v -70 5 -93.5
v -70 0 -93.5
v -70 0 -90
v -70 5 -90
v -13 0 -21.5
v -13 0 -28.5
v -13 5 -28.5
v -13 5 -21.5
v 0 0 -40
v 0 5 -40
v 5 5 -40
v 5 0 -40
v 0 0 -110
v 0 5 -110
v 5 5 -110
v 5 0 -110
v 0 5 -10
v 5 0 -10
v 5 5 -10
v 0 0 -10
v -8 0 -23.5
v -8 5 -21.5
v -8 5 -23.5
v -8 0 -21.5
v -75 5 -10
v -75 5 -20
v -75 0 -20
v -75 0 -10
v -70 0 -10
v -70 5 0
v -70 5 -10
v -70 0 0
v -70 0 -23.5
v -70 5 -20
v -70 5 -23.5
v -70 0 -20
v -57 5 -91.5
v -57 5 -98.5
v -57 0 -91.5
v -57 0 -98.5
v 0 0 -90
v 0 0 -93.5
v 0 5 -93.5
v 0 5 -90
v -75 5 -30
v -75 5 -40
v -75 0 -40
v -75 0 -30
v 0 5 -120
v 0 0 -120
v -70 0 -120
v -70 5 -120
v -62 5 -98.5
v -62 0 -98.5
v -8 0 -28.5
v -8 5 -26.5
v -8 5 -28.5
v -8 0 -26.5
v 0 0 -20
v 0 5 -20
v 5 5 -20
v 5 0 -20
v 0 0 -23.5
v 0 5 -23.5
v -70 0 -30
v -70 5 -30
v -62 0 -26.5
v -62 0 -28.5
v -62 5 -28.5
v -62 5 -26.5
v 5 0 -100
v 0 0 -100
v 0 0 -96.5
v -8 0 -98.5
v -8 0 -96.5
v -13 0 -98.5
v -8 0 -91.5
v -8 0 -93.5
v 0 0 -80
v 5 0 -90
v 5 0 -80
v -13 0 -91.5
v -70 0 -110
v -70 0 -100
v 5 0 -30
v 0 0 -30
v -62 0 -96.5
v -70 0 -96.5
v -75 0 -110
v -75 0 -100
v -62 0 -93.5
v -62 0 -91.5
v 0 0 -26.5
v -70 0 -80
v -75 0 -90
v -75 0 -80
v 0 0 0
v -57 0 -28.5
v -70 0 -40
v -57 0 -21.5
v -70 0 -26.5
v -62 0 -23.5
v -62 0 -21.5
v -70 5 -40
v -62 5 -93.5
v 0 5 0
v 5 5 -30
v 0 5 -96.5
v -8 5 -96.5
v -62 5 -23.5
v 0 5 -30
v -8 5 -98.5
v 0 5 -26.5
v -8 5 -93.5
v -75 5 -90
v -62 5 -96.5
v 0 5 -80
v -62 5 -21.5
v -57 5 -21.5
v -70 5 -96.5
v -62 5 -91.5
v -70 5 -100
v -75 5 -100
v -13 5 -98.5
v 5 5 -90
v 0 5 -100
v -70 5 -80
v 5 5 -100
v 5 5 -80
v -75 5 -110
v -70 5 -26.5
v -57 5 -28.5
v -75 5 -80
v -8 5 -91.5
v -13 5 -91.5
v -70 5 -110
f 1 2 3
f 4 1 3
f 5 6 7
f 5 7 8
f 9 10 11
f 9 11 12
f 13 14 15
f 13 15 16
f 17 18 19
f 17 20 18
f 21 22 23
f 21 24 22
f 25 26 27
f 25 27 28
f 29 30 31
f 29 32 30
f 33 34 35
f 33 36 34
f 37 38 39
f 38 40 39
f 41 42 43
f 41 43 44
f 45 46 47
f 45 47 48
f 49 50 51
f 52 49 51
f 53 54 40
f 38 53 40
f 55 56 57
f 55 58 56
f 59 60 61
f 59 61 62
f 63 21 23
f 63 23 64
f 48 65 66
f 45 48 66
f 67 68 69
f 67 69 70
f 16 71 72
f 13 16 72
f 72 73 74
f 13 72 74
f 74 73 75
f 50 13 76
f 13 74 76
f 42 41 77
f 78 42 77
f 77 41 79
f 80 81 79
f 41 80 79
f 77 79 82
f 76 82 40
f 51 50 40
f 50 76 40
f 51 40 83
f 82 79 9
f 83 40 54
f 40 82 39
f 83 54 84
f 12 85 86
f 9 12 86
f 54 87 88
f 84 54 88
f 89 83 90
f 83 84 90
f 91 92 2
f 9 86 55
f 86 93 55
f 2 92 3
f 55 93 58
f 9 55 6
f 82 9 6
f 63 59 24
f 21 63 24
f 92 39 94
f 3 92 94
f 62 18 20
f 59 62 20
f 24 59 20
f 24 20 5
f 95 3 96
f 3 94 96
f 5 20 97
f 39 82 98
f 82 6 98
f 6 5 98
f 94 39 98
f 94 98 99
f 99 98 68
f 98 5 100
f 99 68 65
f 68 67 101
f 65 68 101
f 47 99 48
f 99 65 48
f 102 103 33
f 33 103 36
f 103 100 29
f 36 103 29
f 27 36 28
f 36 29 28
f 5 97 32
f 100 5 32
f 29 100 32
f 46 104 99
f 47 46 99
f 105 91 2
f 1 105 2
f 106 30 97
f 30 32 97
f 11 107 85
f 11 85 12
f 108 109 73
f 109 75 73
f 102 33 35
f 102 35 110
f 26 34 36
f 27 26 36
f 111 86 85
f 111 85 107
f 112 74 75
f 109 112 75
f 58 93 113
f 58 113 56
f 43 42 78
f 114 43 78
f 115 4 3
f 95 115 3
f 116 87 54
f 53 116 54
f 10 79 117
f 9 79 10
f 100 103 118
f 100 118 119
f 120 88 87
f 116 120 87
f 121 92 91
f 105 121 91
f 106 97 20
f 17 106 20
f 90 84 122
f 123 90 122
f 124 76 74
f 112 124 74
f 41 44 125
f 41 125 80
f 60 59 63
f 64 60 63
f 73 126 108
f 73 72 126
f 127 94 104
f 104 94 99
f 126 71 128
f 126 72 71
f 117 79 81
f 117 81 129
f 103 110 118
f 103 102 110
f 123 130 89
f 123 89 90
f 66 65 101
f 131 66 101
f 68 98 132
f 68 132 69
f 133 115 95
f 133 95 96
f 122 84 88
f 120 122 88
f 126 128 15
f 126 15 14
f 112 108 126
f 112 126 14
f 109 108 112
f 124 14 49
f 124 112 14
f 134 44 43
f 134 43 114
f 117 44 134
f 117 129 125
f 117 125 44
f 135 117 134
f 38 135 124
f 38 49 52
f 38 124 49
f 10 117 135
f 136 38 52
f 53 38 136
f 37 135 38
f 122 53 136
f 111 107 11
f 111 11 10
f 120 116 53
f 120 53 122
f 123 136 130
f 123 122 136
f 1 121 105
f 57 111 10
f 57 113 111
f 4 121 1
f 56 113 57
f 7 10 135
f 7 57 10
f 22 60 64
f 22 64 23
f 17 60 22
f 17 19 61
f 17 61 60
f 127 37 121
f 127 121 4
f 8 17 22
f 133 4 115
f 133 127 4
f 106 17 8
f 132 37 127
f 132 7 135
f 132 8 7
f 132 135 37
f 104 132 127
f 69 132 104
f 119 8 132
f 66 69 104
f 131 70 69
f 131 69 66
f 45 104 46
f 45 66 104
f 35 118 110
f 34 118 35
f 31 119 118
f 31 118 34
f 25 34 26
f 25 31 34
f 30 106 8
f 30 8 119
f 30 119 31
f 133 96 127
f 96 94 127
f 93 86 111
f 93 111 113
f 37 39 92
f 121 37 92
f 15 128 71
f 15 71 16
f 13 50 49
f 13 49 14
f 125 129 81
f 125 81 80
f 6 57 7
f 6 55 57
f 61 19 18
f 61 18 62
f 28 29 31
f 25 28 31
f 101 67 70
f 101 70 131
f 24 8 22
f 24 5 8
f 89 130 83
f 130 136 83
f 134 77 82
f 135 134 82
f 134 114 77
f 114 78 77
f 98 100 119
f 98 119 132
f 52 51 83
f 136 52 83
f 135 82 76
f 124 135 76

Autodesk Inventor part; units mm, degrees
sketch "Sketch1" plane through (0, 0, 0) normal (0, 1, 0) x (-1, 0, 0)
  line L0 (0, -120) -> (70, -120)
  line L1 (70, 0) -> (0, 0)
  line L2 (0, 0) -> (0, -5)
  line L3 (0, -120) -> (0, -115)
  line L4 (0, -5) -> (0, -3.5)
  line L5 (0, -120) -> (0, -115)
  line L6 (70, 45) -> (70, 46.5)
  line L7 (70, -73.5) -> (70, -26.5)
  line L8 (70, -60) -> (70, -58.5)
  line L9 (70, -73.5) -> (70, -88.5)
  line L10 (0, -115) -> (0, -120)
  line L11 (70, -73.5) -> (70, -76.5)
  line L12 (0, -33.5) -> (0, -36.5)
  line L13 (0, -80) -> (0, -36.5)
  line L14 (0, -55) -> (0, -26.5)
  line L15 (0, -26.5) -> (8, -26.5)
  line L16 (8, -26.5) -> (8, -28.5)
  line L17 (8, -28.5) -> (13, -28.5)
  line L18 (13, -28.5) -> (13, -21.5)
  line L19 (13, -21.5) -> (8, -21.5)
  line L20 (8, -21.5) -> (8, -23.5)
  line L21 (8, -23.5) -> (0, -23.5)
  line L22 (13, -25) -> (57, -25)
  line L23 (70, -25) -> (70, -23.5)
  line L24 (70, -23.5) -> (62, -23.5)
  line L25 (62, -23.5) -> (62, -21.5)
  line L26 (62, -21.5) -> (57, -21.5)
  line L27 (57, -21.5) -> (57, -28.5)
  line L28 (57, -28.5) -> (62, -28.5)
  line L29 (62, -28.5) -> (62, -26.5)
  line L30 (62, -26.5) -> (70, -26.5)
  line L31 (0, 0) -> (0, -23.5)
  line L32 (0, -26.5) -> (0, -55)
  line L33 (0, -5) -> (0, -23.5)
  line L34 (0, -26.5) -> (0, -33.5)
  line L35 (0, -5) -> (0, -23.5)
  line L36 (0, -26.5) -> (0, -33.5)
  line L37 (0, 0) -> (0, -23.5)
  line L38 (0, -26.5) -> (0, -33.5)
  line L39 (70, 0) -> (70, -23.5)
  line L40 (70, -26.5) -> (70, -88.5)
  line L41 (0, -83.5) -> (0, -80)
  line L42 (0, -80) -> (0, -83.5)
  line L43 (70, -88.5) -> (70, -76.5)
  line L44 (13, -25) -> (0, -25)
  line L45 (0, -83.5) -> (0, -88.5)
  line L46 (0, -91.5) -> (0, -88.5)
  line L47 (70, -91.5) -> (70, -88.5)
  line L48 (0, -26.5) -> (0, -60)
  line L49 (0, -60) -> (70, -60)
  line L50 (0, -93.5) -> (8, -93.5)
  line L51 (8, -93.5) -> (8, -91.5)
  line L52 (8, -91.5) -> (13, -91.5)
  line L53 (13, -91.5) -> (13, -98.5)
  line L54 (13, -98.5) -> (8, -98.5)
  line L55 (8, -98.5) -> (8, -96.5)
  line L56 (8, -96.5) -> (0, -96.5)
  line L57 (13, -95) -> (57, -95)
  line L58 (70, -96.5) -> (62, -96.5)
  line L59 (62, -96.5) -> (62, -98.5)
  line L60 (62, -98.5) -> (57, -98.5)
  line L61 (57, -98.5) -> (57, -91.5)
  line L62 (57, -91.5) -> (62, -91.5)
  line L63 (62, -91.5) -> (62, -93.5)
  line L64 (62, -93.5) -> (70, -93.5)
  line L65 (0, -93.5) -> (0, -86.5)
  line L66 (0, -93.5) -> (0, -86.5)
  line L67 (0, -93.5) -> (0, -86.5)
  line L68 (0, -91.5) -> (0, -93.5)
  line L69 (0, -96.5) -> (0, -110)
  line L70 (0, -120) -> (0, -96.5)
  line L71 (0, -93.5) -> (0, -91.5)
  line L72 (70, -120) -> (70, -96.5)
  line L73 (70, -93.5) -> (70, -91.5)
  dimension "d70" = 120
  dimension "d115" = 5
  dimension "d116" = 7
  dimension "d117" = 5
  dimension "d119" = 8
  dimension "d120" = 2
  dimension "d121" = 5
  dimension "d123" = 25
  dimension "d124" = 1.5
  dimension "d125" = 1.5
  dimension "d126" = 1.5
  dimension "d127" = 1.5
  dimension "d128" = 35
  dimension "d130" = 70
  dimension "d131" = 8
  dimension "d132" = 2
ref_plane "Work Plane2" through (0, 0, 0) normal (0, -1, 0) x (1, 0, 0)
sketch "Sketch2" plane through (0, 0, 0) normal (0, -1, 0) x (1, 0, 0)
  point P0 (0, 0)
ref_plane "Work Plane3" through (0, 0, 0) normal (1, 0, 0) x (0, 0, -1)
sketch "Sketch3" plane through (0, 0, 0) normal (1, 0, 0) x (0, 0, -1)
  line L0 (0, 0) -> (10, 0)
  line L1 (10, 0) -> (10, 5)
  line L2 (10, 5) -> (20, 5)
  line L3 (20, 5) -> (20, 0)
  line L4 (20, 0) -> (10, 0)
  line L5 (20, 0) -> (30, 0)
  line L6 (30, 0) -> (30, 5)
  line L7 (30, 5) -> (40, 5)
  line L8 (40, 5) -> (40, 0)
  line L9 (40, 0) -> (30, 0)
  line L10 (40, 0) -> (80, 0)
  line L11 (80, 0) -> (80, 5)
  line L12 (80, 5) -> (90, 5)
  line L13 (90, 5) -> (90, 0)
  line L14 (90, 0) -> (100, 0)
  line L15 (100, 0) -> (100, 5)
  line L16 (100, 5) -> (110, 5)
  line L17 (110, 5) -> (110, 0)
  line L18 (110, 0) -> (100, 0)
  line L19 (90, 0) -> (80, 0)
  dimension "d46" = 10
  dimension "d47" = 5
  dimension "d48" = 10
  dimension "d49" = 10
  dimension "d50" = 10
  dimension "d75" = 5
  dimension "d76" = 10
  dimension "d77" = 10
  dimension "d78" = 5
  dimension "d79" = 10
  dimension "d129" = 40
ref_plane "Work Plane1" through (-70, 0, 0) normal (-1, 0, 0) x (0, 0, 1)
sketch "Sketch4" plane through (-70, 0, 0) normal (-1, 0, 0) x (0, 0, 1)
  line L0 (0, 0) -> (-10, 0)
  line L1 (-10, 0) -> (-10, 5)
  line L2 (-10, 5) -> (-20, 5)
  line L3 (-20, 5) -> (-20, 0)
  line L4 (-10, 0) -> (-20, 0)
  line L5 (-20, 0) -> (-30, 0)
  line L6 (-30, 0) -> (-30, 5)
  line L7 (-30, 5) -> (-40, 5)
  line L8 (-40, 5) -> (-40, 0)
  line L9 (-40, 0) -> (-30, 0)
  line L10 (-40, 5) -> (-40, 0)
  line L11 (-40, 0) -> (-80, 0)
  line L12 (-80, 0) -> (-80, 5)
  line L13 (-80, 5) -> (-90, 5)
  line L14 (-90, 5) -> (-90, 0)
  line L15 (-90, 0) -> (-80, 0)
  line L16 (-90, 0) -> (-100, 0)
  line L17 (-100, 0) -> (-100, 5)
  line L18 (-100, 5) -> (-110, 5)
  line L19 (-110, 5) -> (-110, 0)
  line L20 (-100, 0) -> (-110, 0)
  dimension "d58" = 10
  dimension "d59" = 5
  dimension "d60" = 10
  dimension "d61" = 10
  dimension "d62" = 10
  dimension "d80" = 40
  dimension "d81" = 10
  dimension "d82" = 10
  dimension "d83" = 10
extrude "Extrusion12" add sketch "Sketch1" along normal blind 5
extrude "Extrusion13" add sketch "Sketch3" along normal blind 5
extrude "Extrusion14" add sketch "Sketch4" along normal blind 5
properties part number "frontal"
